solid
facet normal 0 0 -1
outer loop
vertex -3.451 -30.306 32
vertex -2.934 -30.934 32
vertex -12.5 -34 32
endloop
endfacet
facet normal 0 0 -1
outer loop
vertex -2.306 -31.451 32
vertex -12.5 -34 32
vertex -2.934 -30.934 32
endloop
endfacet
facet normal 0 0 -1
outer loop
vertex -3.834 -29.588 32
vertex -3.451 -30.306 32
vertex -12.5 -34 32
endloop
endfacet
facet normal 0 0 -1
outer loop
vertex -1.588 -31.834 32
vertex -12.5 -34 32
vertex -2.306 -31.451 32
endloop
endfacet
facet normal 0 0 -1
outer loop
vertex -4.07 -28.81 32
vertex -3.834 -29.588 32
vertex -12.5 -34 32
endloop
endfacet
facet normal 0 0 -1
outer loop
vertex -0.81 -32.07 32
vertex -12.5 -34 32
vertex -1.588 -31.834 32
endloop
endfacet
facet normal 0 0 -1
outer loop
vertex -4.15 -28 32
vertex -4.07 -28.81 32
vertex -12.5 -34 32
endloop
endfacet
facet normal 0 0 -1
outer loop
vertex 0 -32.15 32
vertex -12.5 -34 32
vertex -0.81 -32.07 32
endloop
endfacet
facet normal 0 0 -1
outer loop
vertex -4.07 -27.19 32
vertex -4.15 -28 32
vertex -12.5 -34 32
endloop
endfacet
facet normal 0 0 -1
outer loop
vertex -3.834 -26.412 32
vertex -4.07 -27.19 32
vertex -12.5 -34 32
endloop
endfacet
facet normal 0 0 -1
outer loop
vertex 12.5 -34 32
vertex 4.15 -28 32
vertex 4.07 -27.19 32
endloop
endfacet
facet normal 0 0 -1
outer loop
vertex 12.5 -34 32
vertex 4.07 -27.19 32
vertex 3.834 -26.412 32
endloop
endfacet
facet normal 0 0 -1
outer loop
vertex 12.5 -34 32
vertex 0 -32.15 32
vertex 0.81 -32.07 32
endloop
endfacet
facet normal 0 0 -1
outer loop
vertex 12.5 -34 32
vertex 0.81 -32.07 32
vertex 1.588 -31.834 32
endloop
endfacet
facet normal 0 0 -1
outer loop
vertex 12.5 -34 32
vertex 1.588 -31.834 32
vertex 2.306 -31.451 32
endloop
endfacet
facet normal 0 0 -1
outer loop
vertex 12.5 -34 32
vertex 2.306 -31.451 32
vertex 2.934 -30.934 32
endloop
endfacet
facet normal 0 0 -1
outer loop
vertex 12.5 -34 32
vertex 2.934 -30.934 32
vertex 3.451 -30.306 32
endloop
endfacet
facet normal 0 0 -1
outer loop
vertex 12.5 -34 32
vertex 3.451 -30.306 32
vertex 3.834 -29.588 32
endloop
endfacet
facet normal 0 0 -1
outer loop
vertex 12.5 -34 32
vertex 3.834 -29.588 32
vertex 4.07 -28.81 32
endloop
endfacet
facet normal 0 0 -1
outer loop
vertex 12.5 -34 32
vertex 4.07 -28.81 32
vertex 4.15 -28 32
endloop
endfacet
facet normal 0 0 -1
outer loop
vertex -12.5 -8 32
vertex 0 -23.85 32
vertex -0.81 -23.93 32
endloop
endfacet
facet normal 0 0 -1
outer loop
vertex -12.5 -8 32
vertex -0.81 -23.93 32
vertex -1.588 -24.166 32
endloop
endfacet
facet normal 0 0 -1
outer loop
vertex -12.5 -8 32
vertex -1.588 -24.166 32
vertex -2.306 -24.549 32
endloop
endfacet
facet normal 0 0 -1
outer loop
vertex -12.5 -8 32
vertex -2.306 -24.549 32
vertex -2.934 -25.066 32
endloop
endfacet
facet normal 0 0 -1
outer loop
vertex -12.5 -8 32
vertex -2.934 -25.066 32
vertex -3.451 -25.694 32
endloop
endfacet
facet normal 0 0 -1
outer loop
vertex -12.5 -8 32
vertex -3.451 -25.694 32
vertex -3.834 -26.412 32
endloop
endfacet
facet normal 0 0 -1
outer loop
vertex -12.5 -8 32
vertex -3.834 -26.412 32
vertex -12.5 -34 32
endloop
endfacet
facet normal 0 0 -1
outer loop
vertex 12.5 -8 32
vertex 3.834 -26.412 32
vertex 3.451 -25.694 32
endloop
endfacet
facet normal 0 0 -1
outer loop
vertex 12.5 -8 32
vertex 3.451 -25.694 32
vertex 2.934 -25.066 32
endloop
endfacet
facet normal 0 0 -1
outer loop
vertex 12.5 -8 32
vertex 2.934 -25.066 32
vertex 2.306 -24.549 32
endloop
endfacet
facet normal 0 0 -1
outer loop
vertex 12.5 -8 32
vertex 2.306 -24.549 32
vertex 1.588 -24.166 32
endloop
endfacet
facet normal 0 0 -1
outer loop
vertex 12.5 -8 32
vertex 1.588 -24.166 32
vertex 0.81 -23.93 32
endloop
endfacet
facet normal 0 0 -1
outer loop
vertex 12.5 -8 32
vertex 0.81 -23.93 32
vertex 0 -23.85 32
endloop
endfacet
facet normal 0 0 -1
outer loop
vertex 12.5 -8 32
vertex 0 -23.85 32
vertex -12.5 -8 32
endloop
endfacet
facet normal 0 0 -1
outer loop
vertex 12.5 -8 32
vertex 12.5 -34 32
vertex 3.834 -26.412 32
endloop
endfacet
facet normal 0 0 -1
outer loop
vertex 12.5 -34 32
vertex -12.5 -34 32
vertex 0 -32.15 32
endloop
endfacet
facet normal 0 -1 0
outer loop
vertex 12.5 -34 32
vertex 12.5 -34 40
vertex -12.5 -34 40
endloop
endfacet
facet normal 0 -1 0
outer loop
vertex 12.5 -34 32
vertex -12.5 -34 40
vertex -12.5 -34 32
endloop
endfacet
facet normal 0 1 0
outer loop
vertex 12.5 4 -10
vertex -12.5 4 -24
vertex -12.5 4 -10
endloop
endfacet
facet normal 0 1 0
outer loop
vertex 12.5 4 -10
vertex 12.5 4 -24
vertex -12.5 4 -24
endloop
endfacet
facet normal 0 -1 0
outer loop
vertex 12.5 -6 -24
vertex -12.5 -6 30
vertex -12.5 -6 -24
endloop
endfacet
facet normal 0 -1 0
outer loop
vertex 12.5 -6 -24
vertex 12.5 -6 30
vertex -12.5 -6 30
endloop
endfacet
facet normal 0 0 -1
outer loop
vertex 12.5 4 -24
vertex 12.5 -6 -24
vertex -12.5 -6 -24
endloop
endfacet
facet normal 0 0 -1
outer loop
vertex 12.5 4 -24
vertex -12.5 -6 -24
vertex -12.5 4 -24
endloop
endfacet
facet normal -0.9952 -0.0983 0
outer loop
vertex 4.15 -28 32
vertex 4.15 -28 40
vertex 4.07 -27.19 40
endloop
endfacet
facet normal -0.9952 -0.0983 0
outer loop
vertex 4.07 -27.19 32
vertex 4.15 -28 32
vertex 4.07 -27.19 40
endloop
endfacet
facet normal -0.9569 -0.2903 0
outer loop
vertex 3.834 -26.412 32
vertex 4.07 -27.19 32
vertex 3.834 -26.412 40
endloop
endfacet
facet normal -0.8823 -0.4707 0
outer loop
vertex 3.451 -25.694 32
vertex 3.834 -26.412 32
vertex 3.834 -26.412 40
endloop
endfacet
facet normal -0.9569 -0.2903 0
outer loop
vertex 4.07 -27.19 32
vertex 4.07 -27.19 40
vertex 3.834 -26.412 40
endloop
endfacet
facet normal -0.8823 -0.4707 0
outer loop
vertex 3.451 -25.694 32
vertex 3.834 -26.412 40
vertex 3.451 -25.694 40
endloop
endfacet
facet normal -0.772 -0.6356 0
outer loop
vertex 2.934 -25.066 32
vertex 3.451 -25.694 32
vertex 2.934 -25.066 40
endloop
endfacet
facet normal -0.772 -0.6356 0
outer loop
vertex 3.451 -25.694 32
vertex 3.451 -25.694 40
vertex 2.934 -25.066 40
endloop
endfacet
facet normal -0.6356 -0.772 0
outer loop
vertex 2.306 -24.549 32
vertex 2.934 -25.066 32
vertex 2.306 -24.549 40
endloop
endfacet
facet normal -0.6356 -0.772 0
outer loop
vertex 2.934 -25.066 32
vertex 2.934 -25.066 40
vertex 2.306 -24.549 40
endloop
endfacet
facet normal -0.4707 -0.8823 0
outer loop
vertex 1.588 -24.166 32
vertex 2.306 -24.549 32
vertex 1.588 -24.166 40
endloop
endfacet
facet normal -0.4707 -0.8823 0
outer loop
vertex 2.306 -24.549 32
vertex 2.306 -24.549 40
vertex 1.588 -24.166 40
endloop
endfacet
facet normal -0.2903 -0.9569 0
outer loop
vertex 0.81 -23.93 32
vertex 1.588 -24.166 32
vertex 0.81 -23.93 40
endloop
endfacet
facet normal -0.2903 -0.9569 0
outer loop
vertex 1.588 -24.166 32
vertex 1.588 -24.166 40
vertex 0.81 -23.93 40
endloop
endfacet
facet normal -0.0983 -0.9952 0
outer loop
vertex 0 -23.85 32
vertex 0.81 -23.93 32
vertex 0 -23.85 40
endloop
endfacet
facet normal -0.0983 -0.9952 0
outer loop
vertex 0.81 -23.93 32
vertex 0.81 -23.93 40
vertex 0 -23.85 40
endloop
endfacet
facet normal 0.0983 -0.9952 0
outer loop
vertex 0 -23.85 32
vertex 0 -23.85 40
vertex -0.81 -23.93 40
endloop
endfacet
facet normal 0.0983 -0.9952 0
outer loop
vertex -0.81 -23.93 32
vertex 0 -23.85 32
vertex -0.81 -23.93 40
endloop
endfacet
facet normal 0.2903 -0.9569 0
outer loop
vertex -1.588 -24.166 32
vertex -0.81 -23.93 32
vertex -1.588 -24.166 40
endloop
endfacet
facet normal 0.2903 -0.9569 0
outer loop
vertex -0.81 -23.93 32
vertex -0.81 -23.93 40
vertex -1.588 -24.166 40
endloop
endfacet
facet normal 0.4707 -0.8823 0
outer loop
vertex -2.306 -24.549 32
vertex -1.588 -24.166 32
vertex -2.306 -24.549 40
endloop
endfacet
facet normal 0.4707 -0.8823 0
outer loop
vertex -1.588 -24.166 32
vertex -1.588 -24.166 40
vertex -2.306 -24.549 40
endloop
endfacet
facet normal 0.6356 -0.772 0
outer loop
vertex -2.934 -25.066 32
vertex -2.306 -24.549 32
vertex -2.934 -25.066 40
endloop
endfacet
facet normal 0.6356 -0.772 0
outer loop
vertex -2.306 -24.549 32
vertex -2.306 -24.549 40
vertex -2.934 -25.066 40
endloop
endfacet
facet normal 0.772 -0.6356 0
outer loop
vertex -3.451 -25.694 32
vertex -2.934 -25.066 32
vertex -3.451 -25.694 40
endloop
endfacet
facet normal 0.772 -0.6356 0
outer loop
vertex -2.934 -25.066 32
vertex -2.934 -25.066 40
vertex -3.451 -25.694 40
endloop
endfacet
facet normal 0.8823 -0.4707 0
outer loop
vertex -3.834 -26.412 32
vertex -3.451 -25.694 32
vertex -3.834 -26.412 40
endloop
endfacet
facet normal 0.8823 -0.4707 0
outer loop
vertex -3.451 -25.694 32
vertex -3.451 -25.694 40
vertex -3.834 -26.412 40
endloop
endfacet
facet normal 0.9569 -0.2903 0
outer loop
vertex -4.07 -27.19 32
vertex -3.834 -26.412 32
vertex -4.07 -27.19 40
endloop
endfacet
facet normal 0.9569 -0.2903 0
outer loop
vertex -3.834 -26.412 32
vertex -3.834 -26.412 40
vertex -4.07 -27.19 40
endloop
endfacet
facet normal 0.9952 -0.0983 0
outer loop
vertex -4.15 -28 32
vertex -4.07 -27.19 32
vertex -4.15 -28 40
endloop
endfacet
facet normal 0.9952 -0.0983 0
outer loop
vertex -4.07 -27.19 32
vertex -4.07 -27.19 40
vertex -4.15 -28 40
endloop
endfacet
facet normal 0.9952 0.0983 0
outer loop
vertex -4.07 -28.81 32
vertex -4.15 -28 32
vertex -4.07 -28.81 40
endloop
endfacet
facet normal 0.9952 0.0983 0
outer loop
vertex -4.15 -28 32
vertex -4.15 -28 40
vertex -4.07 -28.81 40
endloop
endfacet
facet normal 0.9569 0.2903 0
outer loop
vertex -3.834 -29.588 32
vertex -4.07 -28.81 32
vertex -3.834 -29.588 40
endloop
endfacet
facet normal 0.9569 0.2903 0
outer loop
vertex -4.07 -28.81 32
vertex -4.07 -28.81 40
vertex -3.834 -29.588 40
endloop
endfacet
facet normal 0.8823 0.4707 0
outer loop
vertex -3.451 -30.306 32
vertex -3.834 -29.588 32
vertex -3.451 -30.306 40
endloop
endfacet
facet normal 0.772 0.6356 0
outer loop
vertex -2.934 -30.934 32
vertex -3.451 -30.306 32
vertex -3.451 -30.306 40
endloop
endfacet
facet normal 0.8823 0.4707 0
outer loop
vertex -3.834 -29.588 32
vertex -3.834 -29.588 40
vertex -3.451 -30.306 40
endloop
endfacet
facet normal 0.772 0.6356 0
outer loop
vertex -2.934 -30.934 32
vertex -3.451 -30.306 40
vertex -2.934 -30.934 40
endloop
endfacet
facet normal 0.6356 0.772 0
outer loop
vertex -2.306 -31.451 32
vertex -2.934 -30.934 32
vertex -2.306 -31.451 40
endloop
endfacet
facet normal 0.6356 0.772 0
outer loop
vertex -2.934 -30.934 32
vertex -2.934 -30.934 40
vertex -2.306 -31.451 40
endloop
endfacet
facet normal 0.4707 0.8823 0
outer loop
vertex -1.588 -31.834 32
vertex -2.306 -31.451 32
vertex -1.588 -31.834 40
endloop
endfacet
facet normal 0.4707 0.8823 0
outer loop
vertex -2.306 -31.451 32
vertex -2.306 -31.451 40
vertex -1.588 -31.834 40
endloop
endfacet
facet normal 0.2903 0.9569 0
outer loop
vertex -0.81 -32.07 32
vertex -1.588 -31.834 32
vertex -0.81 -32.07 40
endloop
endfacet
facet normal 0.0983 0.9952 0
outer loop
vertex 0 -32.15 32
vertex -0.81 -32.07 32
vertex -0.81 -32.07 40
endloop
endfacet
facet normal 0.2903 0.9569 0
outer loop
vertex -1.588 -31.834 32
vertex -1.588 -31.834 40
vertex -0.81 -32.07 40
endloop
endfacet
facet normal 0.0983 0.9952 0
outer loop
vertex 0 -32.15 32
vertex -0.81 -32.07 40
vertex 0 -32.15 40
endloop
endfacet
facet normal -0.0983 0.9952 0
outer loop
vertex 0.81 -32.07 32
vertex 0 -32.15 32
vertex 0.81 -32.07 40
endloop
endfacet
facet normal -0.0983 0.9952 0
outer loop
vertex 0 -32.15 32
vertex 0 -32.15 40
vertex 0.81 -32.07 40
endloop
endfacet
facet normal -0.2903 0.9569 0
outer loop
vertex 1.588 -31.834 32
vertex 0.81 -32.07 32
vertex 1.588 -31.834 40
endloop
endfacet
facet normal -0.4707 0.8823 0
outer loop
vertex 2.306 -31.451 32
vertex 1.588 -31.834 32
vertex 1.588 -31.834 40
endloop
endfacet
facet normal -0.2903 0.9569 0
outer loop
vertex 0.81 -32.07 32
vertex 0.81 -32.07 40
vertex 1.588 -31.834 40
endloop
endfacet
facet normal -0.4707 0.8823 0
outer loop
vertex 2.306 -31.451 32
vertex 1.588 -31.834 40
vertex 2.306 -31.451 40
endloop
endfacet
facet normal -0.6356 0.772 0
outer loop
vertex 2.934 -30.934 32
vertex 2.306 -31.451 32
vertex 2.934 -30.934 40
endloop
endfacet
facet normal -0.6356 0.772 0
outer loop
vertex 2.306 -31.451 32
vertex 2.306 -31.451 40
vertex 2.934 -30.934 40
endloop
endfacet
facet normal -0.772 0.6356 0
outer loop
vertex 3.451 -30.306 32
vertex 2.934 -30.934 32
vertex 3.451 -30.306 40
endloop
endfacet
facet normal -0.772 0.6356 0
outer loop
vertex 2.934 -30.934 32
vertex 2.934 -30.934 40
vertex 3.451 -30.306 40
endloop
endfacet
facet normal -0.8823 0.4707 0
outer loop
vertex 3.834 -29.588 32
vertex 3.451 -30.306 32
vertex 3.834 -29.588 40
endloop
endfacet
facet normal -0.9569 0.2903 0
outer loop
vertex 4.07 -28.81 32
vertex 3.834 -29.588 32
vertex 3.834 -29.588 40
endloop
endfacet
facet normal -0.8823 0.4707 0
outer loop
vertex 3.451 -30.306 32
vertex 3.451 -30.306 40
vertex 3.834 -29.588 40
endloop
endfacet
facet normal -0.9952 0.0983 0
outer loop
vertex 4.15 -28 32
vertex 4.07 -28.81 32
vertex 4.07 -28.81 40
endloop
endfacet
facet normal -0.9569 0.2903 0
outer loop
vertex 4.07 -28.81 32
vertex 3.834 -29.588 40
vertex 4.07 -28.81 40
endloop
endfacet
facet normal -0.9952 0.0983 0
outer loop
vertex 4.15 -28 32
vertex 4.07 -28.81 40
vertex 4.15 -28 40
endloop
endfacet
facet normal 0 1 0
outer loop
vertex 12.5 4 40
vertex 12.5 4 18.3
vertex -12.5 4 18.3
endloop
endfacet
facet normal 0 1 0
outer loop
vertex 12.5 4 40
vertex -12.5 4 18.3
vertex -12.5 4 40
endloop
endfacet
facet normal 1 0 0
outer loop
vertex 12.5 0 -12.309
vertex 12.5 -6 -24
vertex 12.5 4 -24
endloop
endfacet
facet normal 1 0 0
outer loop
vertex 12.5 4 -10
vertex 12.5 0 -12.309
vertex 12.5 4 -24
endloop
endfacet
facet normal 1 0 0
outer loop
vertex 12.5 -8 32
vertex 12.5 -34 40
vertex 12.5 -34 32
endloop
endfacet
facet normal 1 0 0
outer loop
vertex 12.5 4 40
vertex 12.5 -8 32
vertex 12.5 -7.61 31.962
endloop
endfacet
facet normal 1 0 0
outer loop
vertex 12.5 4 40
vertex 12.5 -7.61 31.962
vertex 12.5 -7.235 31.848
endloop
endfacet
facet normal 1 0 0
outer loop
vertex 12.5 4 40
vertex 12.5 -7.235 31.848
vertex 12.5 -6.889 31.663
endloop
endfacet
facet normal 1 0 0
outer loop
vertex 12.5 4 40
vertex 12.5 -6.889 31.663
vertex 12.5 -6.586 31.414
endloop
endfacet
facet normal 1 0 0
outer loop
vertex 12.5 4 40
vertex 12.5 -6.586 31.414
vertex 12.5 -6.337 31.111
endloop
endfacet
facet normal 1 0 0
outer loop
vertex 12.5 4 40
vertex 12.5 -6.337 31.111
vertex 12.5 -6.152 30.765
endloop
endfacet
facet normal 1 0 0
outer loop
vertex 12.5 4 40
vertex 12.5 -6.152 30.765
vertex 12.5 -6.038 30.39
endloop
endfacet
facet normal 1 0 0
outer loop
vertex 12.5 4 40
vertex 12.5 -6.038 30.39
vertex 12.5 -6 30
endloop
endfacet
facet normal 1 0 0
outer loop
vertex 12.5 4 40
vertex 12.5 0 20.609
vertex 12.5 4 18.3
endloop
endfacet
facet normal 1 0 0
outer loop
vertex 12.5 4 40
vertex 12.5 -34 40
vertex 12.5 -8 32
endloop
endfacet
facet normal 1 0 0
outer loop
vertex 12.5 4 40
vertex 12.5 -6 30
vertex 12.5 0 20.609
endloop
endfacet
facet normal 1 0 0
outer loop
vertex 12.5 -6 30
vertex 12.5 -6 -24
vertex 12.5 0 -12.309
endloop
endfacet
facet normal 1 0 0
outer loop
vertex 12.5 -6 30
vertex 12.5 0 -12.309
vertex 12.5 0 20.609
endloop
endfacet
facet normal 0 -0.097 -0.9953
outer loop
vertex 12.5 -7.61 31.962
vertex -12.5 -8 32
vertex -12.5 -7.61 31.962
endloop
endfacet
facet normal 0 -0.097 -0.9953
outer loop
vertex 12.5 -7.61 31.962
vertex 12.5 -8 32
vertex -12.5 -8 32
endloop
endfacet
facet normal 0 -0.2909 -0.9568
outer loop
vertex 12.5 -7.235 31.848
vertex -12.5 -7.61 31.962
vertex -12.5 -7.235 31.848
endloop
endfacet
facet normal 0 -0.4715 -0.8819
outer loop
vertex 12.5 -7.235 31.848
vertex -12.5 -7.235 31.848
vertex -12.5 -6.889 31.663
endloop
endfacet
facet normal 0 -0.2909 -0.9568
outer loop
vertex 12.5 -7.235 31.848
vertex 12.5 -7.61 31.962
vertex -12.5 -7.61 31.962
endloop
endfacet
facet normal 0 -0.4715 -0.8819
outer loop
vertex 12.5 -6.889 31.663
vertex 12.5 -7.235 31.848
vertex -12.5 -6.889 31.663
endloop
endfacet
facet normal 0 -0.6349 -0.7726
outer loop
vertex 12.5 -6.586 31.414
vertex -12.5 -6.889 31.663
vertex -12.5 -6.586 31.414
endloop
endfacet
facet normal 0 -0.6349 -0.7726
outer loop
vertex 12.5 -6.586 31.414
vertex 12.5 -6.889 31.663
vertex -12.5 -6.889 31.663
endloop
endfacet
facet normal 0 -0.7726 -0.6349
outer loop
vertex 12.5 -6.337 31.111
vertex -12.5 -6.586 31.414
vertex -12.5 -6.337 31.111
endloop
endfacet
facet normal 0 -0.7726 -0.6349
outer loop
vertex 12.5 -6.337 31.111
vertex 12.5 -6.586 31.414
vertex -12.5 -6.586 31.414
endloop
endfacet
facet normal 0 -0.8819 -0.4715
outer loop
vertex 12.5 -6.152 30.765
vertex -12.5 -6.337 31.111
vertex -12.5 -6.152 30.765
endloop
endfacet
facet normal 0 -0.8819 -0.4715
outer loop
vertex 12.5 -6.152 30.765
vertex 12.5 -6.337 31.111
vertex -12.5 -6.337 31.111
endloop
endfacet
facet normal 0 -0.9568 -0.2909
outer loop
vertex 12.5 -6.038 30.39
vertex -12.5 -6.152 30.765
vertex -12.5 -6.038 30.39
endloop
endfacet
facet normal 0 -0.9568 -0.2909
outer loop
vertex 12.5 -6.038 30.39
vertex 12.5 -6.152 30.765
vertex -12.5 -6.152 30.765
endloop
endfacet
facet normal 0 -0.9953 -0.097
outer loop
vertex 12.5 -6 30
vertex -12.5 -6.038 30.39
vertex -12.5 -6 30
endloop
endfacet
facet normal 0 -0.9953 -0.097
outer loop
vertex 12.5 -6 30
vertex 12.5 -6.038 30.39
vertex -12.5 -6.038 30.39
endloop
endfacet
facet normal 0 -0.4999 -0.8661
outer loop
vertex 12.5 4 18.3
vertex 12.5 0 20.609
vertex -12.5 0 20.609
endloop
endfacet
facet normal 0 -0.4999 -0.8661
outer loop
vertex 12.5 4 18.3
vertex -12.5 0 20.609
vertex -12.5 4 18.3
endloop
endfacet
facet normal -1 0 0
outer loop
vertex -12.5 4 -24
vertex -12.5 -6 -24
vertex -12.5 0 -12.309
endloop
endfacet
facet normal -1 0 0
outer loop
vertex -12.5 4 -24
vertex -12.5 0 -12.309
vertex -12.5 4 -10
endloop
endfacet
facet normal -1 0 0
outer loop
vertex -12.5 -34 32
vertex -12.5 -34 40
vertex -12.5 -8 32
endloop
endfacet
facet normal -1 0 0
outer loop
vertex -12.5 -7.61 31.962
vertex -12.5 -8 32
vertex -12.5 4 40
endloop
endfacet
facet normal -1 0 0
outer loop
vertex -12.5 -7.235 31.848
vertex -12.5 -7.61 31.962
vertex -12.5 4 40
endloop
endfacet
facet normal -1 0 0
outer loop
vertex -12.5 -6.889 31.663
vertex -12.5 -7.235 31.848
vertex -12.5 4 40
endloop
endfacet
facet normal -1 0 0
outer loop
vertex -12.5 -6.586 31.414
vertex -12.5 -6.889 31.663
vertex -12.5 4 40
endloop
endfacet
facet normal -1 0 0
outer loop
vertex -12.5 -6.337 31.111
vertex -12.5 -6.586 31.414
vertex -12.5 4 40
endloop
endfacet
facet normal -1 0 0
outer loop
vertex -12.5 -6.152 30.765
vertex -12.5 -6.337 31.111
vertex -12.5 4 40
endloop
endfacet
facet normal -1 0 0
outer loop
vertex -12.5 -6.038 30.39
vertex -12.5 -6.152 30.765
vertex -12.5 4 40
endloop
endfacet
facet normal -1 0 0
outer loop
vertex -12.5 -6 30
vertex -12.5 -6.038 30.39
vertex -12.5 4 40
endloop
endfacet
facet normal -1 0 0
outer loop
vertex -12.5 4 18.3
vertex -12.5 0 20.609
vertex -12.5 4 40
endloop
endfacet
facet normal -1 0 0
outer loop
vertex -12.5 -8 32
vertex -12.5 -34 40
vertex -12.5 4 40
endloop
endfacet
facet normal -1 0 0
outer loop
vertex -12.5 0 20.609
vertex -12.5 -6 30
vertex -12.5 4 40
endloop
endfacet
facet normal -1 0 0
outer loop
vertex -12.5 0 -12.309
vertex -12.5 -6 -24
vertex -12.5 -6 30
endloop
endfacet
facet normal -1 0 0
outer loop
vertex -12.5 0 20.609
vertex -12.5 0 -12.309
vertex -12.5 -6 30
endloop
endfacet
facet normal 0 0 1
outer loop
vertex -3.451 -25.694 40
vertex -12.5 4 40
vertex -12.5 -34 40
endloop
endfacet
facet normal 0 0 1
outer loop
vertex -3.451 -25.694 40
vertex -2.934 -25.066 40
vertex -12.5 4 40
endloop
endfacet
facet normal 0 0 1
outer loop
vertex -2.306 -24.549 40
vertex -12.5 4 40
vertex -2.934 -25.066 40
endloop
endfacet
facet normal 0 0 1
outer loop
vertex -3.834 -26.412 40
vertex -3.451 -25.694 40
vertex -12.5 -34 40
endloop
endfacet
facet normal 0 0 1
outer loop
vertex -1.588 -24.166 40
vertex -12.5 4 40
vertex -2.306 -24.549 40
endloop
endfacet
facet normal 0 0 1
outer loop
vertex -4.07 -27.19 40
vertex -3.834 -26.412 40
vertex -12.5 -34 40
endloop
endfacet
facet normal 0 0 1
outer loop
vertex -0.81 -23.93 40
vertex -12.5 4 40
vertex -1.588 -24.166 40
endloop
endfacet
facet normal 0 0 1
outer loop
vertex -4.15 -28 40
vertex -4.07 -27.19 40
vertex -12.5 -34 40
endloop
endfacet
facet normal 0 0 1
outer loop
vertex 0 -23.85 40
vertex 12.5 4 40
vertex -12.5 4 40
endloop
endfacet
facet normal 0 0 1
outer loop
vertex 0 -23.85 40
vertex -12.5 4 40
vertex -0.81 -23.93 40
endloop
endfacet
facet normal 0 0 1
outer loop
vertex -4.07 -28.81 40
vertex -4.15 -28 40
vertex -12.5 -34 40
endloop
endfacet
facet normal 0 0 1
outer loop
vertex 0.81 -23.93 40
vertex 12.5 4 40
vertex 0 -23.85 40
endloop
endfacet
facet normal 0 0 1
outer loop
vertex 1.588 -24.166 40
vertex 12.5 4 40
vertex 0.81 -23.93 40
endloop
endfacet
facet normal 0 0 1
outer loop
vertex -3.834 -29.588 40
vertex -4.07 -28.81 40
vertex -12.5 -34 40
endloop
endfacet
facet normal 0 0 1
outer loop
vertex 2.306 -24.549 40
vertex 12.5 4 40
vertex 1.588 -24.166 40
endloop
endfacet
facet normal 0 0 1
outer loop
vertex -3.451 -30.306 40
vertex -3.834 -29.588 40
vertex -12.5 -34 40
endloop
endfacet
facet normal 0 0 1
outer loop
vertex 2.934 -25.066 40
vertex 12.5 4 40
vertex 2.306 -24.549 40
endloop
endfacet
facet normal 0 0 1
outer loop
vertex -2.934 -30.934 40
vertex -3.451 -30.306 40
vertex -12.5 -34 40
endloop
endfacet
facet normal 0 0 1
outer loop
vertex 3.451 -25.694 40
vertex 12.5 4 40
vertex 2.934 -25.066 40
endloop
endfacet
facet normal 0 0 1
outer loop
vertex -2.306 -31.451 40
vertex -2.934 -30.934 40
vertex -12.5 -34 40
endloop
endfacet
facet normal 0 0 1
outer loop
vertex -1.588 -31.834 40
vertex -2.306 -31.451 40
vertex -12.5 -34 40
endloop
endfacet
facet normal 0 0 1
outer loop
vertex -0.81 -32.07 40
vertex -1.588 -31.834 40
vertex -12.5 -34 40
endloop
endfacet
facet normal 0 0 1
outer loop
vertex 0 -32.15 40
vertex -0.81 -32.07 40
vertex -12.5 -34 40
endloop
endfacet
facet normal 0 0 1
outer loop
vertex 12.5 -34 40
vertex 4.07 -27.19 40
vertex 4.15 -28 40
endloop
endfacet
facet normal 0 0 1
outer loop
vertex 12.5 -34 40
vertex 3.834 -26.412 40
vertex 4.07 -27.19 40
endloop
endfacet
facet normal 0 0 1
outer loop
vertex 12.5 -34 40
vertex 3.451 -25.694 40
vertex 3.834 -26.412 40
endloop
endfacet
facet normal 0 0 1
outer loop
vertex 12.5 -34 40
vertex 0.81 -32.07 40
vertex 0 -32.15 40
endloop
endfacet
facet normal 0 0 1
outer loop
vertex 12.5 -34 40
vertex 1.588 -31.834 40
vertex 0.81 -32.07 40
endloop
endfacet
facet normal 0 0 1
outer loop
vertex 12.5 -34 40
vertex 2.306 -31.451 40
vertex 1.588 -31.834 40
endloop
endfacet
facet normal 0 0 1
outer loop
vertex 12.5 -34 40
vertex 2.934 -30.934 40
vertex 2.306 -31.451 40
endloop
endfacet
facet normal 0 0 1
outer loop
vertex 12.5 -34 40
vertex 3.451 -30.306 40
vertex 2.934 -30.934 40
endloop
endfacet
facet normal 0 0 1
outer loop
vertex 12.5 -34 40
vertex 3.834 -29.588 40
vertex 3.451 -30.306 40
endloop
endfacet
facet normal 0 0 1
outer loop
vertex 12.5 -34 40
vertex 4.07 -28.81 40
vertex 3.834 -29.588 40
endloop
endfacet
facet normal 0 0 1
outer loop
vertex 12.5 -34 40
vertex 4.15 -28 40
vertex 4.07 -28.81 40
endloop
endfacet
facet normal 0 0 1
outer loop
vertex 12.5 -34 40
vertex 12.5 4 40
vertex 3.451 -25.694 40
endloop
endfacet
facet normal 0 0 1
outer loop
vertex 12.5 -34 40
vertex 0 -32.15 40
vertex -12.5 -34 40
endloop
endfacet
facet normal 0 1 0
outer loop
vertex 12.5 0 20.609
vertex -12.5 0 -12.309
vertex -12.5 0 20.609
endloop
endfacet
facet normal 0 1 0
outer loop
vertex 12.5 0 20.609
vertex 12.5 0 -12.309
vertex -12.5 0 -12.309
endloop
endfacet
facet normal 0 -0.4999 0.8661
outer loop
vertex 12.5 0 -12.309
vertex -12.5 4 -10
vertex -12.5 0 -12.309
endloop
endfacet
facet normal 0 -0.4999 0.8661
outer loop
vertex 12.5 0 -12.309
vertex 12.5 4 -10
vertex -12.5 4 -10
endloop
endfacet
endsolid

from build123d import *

# Parameters (mm, degrees)
F1_DEPTH = 12.5
F2_R     = 4.15
F3_DEPTH = 8
F4_R     = 2


with BuildPart() as f1:
    # F0 (on Right) → F1 (new body, symmetric)
    with BuildSketch(Plane.YZ):
        Polygon((0, -12.309401), (0, 20.609401), (4, 18.3), (4, 40), (-6, 40), (-34, 40), (-34, 32), (-6, 32), (-6, -24), (4, -24), (4, -10), align=None)
    extrude(amount=F1_DEPTH, both=True)

    # F2 (on face) → F3 (cut, through all)
    with BuildSketch(Plane.XY.offset(40)):
        with Locations((0, -28)):
            Circle(F2_R)
    extrude(amount=-F3_DEPTH, mode=Mode.SUBTRACT)

    # F4
    f4_edges = [f1.edges().sort_by_distance(p)[0] for p in [
        (0, -6, 32),
    ]]
    fillet(f4_edges, radius=F4_R)


solid = f1.part
